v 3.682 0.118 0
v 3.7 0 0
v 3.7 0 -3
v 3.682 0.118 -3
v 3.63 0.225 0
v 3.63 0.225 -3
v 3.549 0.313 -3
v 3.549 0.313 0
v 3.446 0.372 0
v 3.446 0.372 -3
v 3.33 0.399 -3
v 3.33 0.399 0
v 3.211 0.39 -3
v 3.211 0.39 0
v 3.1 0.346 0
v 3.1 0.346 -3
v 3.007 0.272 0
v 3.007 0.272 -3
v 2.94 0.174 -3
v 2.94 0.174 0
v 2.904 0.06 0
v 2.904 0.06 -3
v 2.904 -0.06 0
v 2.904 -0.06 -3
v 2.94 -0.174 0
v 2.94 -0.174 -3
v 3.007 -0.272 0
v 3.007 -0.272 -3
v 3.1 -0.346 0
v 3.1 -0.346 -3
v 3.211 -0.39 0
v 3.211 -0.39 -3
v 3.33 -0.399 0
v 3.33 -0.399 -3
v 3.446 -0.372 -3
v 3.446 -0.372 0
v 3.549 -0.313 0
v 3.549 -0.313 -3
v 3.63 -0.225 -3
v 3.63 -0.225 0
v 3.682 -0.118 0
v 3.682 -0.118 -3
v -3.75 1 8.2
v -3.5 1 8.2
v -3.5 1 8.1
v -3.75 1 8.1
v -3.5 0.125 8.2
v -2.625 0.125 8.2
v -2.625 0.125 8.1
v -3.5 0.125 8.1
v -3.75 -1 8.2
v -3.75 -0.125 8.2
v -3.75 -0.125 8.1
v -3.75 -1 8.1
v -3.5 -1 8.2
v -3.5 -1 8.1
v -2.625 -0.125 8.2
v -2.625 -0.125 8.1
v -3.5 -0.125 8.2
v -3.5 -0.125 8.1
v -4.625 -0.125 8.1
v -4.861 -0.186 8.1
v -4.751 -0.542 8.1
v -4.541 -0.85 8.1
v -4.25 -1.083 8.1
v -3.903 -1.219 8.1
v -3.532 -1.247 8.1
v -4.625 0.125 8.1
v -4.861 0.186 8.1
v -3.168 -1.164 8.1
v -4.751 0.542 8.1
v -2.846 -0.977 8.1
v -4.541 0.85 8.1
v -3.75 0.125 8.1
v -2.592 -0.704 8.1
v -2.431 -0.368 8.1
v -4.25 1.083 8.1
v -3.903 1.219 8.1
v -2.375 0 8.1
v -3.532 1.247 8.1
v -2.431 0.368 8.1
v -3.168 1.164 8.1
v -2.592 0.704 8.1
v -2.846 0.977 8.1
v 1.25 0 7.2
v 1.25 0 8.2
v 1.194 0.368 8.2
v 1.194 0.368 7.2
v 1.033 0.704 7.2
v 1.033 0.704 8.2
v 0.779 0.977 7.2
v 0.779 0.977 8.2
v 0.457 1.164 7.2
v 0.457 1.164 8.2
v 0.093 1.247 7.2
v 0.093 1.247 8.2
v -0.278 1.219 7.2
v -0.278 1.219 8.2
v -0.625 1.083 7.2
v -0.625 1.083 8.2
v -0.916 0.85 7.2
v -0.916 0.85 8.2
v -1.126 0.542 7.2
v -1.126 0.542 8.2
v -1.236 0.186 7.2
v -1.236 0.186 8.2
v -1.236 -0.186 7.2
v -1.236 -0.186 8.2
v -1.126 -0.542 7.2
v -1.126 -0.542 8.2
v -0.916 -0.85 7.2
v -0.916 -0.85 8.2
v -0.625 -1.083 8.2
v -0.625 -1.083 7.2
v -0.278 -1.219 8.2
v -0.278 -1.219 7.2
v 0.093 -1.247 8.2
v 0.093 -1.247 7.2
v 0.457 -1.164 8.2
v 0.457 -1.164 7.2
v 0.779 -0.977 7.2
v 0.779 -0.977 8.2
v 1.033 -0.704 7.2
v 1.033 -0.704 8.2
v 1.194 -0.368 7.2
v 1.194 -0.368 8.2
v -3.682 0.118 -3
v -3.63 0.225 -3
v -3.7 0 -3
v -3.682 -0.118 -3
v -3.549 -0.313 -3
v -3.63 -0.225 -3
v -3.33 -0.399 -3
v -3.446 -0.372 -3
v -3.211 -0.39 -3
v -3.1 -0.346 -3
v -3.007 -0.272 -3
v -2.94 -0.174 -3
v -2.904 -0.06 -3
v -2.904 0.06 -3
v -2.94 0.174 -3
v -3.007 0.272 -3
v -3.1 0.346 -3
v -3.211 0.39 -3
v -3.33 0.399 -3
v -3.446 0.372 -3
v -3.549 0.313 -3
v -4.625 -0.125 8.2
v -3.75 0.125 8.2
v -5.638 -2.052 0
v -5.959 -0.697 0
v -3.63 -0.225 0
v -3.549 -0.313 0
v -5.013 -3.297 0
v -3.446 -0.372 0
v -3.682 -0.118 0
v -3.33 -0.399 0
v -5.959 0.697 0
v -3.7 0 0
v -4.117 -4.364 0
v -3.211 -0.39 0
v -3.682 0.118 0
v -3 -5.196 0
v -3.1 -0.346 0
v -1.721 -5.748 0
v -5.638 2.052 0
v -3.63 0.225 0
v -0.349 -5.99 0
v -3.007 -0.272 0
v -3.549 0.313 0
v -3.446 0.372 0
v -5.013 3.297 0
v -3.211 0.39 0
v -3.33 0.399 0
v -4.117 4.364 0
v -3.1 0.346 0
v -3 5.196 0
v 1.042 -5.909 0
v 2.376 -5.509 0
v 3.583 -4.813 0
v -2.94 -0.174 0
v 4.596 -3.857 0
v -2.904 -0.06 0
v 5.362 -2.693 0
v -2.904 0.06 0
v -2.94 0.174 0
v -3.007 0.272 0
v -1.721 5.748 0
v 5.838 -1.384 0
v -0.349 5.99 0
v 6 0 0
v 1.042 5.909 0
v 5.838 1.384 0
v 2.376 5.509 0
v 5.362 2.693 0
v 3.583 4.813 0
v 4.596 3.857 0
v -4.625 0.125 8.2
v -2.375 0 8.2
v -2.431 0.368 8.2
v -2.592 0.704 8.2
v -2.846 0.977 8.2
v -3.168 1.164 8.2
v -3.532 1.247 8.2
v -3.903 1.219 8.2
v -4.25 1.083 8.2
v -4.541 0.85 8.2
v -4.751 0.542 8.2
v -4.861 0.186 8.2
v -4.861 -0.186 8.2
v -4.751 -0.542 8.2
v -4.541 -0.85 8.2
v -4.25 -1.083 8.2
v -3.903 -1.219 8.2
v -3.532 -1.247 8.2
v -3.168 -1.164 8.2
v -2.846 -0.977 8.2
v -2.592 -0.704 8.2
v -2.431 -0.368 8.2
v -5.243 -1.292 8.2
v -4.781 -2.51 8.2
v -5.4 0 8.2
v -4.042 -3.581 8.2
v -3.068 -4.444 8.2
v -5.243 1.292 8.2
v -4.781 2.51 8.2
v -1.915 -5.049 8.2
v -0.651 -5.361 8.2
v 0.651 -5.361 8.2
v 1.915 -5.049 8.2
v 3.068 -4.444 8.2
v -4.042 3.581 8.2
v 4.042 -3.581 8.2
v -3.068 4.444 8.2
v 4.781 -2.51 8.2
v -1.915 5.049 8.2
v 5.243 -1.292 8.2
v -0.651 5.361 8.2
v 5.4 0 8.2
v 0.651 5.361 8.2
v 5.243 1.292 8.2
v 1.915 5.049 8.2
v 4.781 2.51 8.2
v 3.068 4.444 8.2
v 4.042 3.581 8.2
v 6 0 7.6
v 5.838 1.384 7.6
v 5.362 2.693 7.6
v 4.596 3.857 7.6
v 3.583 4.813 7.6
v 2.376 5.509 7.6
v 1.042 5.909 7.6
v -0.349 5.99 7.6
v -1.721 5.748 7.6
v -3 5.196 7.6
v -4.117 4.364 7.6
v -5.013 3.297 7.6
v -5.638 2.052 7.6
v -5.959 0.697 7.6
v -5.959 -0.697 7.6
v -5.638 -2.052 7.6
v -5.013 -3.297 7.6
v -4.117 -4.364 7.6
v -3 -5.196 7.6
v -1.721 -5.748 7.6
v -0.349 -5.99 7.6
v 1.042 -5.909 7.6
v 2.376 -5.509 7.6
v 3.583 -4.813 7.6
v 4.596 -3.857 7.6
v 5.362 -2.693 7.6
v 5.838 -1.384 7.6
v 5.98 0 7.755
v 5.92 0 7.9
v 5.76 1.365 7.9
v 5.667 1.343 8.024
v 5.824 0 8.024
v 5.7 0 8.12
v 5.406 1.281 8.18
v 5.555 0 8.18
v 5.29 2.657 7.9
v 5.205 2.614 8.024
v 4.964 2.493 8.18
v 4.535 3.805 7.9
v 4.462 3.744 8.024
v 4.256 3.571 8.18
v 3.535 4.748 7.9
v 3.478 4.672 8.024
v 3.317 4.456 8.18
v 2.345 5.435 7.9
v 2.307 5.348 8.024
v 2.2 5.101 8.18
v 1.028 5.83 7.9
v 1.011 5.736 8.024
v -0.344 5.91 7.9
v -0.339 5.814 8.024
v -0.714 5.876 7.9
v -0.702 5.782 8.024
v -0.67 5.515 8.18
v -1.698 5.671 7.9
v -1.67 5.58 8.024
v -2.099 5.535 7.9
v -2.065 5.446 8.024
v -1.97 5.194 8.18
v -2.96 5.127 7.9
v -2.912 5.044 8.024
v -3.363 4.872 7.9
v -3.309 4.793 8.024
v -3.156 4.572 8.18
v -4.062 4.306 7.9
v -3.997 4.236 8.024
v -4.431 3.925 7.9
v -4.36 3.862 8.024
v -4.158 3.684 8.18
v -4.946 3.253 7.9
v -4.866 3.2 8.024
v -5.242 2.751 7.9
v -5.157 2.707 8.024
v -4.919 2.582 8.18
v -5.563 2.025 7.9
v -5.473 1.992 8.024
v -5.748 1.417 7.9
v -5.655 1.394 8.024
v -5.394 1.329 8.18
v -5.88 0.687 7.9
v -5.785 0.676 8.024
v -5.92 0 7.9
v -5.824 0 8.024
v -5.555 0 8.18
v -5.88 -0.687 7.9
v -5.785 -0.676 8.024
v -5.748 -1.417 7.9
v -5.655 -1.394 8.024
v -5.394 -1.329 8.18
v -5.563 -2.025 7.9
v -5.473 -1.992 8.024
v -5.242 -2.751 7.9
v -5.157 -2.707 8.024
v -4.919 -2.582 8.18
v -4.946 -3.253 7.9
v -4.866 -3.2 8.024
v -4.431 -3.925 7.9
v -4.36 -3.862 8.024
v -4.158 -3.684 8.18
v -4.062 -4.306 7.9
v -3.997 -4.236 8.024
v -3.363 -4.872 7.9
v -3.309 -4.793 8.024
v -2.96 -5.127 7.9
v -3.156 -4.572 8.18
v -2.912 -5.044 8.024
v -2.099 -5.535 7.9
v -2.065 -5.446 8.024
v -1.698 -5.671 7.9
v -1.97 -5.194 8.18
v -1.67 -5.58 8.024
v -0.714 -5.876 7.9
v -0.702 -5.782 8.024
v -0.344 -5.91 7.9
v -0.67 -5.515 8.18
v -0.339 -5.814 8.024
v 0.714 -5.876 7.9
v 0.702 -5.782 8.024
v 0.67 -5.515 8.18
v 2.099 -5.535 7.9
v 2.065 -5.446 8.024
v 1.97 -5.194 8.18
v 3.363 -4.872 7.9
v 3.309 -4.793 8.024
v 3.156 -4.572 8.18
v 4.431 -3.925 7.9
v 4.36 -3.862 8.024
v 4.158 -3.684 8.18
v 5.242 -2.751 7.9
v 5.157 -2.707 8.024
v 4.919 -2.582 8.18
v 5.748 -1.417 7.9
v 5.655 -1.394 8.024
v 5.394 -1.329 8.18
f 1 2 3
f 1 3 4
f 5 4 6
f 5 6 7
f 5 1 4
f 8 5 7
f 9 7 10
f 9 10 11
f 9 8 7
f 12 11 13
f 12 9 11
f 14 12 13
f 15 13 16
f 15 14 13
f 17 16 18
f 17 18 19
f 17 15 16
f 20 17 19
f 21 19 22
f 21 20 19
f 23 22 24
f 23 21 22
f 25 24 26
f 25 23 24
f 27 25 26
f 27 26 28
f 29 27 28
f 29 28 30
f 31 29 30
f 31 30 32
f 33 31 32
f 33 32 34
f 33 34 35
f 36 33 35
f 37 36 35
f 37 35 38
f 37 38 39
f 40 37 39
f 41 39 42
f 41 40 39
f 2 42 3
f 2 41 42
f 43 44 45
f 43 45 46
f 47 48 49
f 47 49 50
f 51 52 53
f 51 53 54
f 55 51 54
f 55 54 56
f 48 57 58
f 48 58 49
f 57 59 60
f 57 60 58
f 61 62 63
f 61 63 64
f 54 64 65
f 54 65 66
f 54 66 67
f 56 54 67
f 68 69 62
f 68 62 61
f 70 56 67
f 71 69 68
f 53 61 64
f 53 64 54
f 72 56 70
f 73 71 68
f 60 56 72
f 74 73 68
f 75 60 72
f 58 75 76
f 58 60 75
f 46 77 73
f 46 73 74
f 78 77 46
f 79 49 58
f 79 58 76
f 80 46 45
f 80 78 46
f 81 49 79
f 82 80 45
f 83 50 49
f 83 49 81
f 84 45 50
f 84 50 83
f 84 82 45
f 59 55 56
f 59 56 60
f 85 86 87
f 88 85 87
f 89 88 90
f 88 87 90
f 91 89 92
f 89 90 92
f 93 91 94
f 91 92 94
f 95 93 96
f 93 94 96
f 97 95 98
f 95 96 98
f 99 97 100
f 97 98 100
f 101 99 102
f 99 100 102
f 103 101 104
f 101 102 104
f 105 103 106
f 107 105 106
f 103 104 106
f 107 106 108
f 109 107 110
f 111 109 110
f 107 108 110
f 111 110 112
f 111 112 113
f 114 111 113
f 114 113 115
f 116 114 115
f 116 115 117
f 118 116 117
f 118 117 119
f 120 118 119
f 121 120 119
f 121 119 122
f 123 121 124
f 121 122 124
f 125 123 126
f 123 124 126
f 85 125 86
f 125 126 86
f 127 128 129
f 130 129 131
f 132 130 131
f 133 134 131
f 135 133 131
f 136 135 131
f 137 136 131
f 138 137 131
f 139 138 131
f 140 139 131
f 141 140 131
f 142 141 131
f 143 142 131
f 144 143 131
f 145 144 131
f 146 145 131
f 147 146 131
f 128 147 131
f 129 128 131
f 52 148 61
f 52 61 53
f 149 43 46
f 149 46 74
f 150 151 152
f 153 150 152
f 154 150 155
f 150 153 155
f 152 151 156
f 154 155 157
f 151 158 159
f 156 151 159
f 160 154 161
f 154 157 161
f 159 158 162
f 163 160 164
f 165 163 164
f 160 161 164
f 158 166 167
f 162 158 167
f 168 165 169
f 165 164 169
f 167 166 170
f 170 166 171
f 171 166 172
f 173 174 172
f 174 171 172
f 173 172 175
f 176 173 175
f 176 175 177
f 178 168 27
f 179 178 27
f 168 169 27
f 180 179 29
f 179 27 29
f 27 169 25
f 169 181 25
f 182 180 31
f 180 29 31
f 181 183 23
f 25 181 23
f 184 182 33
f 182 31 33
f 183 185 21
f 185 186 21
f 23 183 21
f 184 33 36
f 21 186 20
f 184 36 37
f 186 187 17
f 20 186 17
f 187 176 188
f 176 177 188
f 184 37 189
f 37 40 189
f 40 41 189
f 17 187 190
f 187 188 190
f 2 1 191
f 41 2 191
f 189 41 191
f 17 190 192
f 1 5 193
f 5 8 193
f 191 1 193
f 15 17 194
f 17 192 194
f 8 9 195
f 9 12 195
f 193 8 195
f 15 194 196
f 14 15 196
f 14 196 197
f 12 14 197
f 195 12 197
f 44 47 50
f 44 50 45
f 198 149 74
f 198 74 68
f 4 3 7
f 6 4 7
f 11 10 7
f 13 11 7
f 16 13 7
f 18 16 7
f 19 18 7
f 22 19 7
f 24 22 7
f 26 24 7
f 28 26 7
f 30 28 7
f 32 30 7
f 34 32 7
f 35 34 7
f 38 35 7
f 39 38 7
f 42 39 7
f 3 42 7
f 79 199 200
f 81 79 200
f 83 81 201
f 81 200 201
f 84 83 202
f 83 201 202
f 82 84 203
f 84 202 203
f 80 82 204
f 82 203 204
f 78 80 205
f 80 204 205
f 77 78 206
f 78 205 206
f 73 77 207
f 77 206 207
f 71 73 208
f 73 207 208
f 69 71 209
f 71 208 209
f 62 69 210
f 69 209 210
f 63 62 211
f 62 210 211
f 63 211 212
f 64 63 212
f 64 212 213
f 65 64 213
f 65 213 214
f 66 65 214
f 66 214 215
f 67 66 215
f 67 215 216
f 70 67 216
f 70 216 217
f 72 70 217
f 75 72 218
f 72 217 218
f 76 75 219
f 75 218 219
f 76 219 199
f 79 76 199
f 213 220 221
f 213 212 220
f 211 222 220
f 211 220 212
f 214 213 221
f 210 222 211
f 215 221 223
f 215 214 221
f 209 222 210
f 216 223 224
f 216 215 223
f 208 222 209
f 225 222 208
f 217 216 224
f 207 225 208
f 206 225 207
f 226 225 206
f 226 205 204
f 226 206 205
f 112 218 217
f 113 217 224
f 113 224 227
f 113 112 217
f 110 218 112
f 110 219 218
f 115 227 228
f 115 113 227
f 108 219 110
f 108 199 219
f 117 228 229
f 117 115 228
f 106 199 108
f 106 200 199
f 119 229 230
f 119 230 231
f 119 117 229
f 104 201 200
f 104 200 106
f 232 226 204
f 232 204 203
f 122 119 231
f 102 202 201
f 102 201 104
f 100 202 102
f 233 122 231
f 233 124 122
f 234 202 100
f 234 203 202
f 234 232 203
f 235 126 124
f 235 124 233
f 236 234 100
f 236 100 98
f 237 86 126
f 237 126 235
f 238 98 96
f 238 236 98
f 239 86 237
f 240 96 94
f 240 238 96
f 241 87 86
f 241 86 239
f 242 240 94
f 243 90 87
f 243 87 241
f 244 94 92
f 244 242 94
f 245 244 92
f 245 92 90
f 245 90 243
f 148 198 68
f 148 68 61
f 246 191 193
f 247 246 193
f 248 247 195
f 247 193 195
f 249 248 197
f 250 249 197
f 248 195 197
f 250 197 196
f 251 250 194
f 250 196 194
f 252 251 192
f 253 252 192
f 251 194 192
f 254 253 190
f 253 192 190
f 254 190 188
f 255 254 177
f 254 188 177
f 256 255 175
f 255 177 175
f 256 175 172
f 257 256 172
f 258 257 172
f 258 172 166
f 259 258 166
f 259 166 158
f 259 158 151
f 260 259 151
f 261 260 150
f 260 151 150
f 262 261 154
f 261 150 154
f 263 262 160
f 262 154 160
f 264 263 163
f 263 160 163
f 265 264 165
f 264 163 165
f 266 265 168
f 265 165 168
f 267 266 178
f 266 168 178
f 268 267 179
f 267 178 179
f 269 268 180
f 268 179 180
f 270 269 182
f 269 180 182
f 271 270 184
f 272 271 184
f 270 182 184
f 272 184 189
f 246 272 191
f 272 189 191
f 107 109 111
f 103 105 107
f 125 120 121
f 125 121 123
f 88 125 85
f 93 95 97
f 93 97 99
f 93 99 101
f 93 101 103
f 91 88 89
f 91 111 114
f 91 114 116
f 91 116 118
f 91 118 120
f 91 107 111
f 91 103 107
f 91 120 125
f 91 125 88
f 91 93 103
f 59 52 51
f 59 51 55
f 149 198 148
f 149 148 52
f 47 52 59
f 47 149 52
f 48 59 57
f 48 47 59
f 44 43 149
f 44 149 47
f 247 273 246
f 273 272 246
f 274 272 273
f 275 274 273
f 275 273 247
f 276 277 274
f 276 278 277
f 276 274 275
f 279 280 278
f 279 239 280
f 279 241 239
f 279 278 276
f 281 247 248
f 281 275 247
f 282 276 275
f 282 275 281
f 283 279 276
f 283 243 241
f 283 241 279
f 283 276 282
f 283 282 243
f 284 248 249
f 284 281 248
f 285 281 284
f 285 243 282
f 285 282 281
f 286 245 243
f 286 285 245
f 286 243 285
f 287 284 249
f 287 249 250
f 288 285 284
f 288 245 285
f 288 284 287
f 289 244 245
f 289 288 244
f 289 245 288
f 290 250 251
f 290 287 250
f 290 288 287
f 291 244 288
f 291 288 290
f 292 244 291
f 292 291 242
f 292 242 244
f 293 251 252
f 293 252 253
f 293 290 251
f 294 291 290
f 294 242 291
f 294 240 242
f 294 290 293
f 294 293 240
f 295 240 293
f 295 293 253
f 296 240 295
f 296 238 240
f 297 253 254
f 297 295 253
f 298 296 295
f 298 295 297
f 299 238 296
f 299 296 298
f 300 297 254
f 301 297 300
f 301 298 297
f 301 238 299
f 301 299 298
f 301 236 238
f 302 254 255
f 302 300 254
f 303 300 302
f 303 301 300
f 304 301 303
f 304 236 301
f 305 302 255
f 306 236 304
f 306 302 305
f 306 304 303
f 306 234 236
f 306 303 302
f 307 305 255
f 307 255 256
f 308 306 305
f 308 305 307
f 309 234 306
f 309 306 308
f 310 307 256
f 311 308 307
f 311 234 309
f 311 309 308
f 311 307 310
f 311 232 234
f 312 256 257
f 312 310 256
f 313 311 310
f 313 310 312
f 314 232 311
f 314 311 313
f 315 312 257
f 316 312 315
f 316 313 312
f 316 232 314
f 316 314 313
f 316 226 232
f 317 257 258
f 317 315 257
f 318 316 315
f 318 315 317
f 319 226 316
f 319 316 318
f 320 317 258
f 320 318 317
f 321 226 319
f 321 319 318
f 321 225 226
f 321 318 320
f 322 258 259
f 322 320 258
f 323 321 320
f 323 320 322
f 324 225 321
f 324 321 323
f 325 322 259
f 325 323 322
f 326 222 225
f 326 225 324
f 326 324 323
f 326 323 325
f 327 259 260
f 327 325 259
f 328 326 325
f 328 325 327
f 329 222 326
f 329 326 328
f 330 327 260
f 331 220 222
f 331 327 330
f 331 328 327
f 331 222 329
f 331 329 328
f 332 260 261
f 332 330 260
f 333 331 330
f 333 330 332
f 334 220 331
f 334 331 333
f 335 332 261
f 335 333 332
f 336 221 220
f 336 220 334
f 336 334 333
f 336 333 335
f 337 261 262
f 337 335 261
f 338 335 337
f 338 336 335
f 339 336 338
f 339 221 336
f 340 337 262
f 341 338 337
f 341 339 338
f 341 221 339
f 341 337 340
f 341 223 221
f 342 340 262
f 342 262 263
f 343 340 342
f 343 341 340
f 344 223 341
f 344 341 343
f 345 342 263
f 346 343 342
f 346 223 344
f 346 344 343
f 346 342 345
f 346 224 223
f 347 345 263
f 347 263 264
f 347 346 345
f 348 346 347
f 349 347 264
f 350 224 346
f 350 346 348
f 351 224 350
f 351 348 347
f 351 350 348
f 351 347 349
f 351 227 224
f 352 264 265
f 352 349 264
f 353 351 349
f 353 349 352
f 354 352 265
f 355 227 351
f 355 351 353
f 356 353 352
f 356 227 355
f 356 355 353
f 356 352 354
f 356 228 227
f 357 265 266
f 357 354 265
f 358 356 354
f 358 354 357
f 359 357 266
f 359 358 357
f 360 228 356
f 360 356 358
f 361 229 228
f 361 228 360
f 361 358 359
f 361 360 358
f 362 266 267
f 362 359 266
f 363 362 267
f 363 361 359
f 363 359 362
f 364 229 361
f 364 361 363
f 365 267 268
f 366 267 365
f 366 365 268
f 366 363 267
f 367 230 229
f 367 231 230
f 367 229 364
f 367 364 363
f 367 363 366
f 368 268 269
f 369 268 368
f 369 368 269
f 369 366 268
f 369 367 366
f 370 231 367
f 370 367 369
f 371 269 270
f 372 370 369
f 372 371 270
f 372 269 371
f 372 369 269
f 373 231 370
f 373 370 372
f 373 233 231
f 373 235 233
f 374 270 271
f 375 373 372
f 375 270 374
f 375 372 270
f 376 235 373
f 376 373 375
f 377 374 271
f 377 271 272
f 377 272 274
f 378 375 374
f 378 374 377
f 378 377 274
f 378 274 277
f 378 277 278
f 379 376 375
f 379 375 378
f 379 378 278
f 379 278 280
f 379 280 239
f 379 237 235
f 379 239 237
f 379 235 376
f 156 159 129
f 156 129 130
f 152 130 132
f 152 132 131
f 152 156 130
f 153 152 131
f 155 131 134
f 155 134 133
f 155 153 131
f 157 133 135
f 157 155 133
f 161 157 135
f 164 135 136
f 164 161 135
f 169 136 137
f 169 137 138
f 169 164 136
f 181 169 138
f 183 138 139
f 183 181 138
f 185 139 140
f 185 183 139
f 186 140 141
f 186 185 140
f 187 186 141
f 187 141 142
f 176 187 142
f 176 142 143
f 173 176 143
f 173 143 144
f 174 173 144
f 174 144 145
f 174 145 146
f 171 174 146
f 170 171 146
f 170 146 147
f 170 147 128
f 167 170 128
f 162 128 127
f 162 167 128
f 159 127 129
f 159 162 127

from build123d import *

# Parameters (mm, degrees)
ESQUISSE1_R    = 6
CORP_DEPTH     = 8.2
ESQUISSE2_R    = 1.25
TROU_SON_DEPTH = 1
ESQUISSE3_R    = 0.4
PINS_DEPTH     = 3
CONG_1_R       = 0.6
ESQUISSE4_R    = 1.25
PLUS_DEPTH     = 0.1


with BuildPart() as part:
    # Esquisse1 → corp (new body)
    with BuildSketch(Plane.XY):
        Circle(ESQUISSE1_R)
    extrude(amount=CORP_DEPTH)

    # Esquisse2 → trou son (cut)
    with BuildSketch(Plane.XY.offset(8.2)):
        Circle(ESQUISSE2_R)
    extrude(amount=-TROU_SON_DEPTH, mode=Mode.SUBTRACT)

    # Esquisse3 → pins (add)
    with BuildSketch(Plane.XY):
        with Locations((3.3, 0)):
            Circle(ESQUISSE3_R)
        with Locations(Location((-3.3, 0, 0), (0, 0, 180))):
            Circle(ESQUISSE3_R)
    extrude(amount=-PINS_DEPTH)

    # Congé1
    cong_1_edges = [part.edges().sort_by_distance(p)[0] for p in [
        (-6, 0, 8.2),
    ]]
    fillet(cong_1_edges, radius=CONG_1_R)

    # Esquisse4 → plus (cut)
    with BuildSketch(Plane.XY.offset(8.2)):
        with Locations((-3.625, 0)):
            Circle(ESQUISSE4_R)
        Polygon((-2.625, -0.125), (-2.625, 0.125), (-3.5, 0.125), (-3.5, 1), (-3.75, 1), (-3.75, 0.125), (-4.625, 0.125), (-4.625, -0.125), (-3.75, -0.125), (-3.75, -1), (-3.5, -1), (-3.5, -0.125), align=None, mode=Mode.SUBTRACT)
    extrude(amount=-PLUS_DEPTH, mode=Mode.SUBTRACT)


solid = part.part
